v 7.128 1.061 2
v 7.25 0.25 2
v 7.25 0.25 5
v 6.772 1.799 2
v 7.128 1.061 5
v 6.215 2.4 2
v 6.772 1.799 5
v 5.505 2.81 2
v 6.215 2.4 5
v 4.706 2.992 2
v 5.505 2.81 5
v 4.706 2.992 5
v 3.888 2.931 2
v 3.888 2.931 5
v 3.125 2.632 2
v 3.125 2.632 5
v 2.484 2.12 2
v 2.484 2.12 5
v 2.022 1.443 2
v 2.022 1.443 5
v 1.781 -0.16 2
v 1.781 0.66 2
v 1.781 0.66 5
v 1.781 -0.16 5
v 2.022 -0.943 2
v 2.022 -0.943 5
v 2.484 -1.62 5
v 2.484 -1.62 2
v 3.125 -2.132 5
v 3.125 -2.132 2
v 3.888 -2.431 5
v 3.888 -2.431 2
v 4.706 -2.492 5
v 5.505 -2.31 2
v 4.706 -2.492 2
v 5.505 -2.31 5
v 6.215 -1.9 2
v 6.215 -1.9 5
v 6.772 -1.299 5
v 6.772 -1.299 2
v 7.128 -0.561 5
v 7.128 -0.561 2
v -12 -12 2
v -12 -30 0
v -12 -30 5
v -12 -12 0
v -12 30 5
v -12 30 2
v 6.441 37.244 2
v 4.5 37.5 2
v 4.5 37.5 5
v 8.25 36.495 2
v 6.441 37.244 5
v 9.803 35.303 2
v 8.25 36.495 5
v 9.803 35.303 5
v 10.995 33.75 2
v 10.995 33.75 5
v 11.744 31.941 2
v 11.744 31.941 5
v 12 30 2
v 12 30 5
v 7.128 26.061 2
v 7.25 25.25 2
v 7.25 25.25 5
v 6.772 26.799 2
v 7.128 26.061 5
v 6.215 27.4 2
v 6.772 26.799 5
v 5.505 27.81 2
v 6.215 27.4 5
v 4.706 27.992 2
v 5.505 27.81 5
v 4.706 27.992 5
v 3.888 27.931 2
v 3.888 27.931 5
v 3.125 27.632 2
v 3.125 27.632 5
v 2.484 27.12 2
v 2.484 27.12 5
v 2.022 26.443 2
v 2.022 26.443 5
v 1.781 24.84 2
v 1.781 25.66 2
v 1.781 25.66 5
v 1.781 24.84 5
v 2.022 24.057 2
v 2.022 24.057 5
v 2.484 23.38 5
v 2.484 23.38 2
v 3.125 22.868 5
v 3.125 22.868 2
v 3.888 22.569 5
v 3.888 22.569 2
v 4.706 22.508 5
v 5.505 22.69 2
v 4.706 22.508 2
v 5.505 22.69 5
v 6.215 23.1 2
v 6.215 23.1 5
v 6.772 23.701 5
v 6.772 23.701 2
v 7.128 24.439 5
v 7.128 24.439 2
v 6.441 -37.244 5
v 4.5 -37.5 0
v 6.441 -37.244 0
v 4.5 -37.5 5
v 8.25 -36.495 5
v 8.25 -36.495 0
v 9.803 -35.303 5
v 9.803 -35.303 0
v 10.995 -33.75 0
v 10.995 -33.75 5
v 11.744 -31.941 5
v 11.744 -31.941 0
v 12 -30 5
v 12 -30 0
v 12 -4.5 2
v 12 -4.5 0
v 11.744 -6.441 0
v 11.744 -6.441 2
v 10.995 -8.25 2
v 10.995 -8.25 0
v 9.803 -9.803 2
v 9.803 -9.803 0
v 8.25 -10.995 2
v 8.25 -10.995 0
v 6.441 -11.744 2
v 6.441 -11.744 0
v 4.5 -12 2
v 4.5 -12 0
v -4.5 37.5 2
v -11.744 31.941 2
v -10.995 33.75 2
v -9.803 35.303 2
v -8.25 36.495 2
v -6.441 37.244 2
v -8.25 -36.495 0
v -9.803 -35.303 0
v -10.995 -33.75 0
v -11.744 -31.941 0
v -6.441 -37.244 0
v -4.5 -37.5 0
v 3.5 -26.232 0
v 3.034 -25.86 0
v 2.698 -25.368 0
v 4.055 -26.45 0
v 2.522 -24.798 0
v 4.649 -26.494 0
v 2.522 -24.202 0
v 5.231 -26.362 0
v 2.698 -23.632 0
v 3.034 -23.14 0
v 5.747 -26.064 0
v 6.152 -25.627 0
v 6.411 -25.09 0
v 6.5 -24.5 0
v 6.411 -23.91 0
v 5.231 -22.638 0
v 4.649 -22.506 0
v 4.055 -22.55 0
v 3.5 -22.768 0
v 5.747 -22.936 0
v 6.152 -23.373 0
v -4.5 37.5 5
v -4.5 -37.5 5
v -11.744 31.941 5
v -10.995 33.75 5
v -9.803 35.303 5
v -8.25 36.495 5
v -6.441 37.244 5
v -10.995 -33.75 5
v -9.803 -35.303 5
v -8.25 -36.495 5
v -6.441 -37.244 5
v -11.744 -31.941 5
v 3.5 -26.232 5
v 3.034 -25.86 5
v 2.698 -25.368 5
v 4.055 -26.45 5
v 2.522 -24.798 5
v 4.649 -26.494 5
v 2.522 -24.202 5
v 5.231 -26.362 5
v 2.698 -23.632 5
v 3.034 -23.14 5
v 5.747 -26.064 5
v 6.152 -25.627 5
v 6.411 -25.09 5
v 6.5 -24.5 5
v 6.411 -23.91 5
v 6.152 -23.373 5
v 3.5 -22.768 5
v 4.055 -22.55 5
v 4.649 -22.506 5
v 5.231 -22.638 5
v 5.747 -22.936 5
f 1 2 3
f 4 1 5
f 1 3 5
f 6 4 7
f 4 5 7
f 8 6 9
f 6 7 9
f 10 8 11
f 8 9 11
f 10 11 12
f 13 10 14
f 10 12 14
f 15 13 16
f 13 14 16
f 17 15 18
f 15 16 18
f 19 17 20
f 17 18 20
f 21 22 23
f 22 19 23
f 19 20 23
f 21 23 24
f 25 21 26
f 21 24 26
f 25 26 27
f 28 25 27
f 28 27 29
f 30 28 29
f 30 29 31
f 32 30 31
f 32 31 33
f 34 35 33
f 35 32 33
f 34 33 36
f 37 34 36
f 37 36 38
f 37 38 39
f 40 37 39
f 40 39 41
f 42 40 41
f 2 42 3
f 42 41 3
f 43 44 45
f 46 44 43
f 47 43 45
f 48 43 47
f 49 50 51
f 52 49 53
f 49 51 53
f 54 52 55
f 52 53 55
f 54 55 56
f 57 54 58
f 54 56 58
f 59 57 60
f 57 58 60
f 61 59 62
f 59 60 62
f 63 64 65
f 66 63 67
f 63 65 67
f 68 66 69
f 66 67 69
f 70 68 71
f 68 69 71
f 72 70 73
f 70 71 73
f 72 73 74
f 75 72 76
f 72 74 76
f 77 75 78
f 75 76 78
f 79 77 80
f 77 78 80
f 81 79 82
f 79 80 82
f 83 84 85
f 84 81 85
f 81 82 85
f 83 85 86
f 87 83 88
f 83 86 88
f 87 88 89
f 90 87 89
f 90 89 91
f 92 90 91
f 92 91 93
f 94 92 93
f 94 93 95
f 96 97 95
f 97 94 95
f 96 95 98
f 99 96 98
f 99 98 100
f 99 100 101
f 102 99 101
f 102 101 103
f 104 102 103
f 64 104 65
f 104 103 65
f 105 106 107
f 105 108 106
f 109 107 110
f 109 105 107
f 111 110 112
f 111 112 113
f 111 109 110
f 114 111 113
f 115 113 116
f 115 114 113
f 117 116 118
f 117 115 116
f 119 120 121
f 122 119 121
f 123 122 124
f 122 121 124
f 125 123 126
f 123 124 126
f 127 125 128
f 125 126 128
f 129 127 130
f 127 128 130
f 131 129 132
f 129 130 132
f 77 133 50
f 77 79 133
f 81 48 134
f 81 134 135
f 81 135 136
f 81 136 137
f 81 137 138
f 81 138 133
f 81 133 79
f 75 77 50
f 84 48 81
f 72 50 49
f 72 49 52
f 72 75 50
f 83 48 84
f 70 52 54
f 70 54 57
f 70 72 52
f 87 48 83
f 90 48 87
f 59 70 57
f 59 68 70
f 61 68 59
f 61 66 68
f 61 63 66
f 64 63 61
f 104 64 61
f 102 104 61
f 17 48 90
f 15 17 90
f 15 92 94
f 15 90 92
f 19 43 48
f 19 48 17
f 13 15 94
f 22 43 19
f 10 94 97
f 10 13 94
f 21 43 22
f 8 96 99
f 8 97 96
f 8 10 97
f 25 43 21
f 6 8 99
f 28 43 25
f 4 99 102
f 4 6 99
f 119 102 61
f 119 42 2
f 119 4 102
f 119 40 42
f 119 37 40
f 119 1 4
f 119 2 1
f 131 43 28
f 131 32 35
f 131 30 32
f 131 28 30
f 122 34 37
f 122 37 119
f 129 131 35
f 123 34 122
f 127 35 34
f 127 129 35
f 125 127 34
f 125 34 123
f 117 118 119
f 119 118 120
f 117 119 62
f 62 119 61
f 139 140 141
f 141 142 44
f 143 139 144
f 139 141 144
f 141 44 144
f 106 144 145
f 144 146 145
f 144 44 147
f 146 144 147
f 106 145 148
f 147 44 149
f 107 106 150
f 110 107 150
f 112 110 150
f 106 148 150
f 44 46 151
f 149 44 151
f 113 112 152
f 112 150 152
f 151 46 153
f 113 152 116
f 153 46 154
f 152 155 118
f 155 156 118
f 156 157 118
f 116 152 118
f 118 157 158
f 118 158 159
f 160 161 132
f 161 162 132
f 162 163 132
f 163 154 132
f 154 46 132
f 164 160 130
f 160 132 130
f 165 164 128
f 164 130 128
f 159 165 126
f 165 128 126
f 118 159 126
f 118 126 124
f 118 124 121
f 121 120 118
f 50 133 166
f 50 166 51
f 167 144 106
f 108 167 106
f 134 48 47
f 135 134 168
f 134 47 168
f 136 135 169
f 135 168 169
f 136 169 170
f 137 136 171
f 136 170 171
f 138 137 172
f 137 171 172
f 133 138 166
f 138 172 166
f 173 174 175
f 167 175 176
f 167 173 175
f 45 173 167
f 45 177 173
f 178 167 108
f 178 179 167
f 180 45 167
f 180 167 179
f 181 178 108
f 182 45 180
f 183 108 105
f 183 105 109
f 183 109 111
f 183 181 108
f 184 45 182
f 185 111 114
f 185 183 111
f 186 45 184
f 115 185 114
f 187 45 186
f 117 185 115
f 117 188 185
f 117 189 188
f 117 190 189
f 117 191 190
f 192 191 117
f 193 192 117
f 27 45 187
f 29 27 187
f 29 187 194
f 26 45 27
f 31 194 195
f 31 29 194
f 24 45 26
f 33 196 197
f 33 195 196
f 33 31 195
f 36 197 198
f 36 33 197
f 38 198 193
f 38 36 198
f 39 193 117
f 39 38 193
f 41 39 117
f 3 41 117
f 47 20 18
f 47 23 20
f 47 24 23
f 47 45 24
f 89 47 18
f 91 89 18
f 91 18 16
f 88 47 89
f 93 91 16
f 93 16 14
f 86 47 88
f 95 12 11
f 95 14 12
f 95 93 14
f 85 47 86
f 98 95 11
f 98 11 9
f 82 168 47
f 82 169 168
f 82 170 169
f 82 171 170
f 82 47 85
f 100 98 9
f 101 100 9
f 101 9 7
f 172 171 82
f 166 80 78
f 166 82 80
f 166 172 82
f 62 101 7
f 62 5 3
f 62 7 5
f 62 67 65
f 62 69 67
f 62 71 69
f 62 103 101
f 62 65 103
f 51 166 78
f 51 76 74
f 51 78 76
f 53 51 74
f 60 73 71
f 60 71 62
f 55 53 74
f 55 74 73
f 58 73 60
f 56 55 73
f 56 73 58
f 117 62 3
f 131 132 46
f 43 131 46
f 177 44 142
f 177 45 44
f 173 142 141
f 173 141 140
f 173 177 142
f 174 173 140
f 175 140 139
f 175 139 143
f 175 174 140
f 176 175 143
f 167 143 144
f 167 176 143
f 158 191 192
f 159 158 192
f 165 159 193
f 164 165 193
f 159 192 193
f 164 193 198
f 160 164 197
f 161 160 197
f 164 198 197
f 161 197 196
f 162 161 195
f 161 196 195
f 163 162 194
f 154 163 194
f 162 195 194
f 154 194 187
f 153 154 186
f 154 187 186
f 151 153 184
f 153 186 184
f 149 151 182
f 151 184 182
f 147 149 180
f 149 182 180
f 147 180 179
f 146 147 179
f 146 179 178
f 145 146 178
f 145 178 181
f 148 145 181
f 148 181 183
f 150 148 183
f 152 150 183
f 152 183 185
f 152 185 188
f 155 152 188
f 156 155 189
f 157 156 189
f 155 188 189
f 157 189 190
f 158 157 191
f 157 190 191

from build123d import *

# Parameters (mm, degrees)
F0_W     = 24
F0_H     = 75
F1_DEPTH = 5
F2_R     = 2.75
F2_R_2   = 2
F3_DEPTH = 5
F4_R     = 7.5
F5_R     = 2.75
F6_DEPTH = 2


with BuildPart() as f1:
    # F0 (on Top) → F1 (new body)
    with BuildSketch(Plane.XY):
        Rectangle(F0_W, F0_H)
    extrude(amount=F1_DEPTH)

    # F2 (on face) → F3 (cut)
    with BuildSketch(Plane.XY.offset(5)):
        with Locations((4.5, 25.25)):
            Circle(F2_R)
        with Locations((4.5, 0.25)):
            Circle(F2_R)
        with Locations((4.5, -24.5)):
            Circle(F2_R_2)
    extrude(amount=-F3_DEPTH, mode=Mode.SUBTRACT)

    # F4
    f4_edges = [f1.edges().sort_by_distance(p)[0] for p in [
        (12, 37.5, 2.5),
        (-12, 37.5, 2.5),
        (12, -37.5, 2.5),
        (-12, -37.5, 2.5),
    ]]
    fillet(f4_edges, radius=F4_R)

    # F5 (on face) → F6 (cut)
    with BuildSketch(Plane(origin=(0, 0, 0), x_dir=(1, 0, 0), z_dir=(0, 0, -1))):
        with BuildLine():
            Line((4.5, 12), (-12, 12))
            Line((-12, 12), (-12, -30))
            ThreePointArc((-12, -30), (-9.803301, -35.303301), (-4.5, -37.5))
            Line((-4.5, -37.5), (4.5, -37.5))
            ThreePointArc((4.5, -37.5), (9.803301, -35.303301), (12, -30))
            Line((12, -30), (12, 4.5))
            ThreePointArc((12, 4.5), (9.803301, 9.803301), (4.5, 12))
        make_face()
        with Locations((4.5, -25.25)):
            Circle(F5_R, mode=Mode.SUBTRACT)
        with Locations((4.5, -0.25)):
            Circle(F5_R, mode=Mode.SUBTRACT)
    extrude(amount=-F6_DEPTH, mode=Mode.SUBTRACT)


solid = f1.part
